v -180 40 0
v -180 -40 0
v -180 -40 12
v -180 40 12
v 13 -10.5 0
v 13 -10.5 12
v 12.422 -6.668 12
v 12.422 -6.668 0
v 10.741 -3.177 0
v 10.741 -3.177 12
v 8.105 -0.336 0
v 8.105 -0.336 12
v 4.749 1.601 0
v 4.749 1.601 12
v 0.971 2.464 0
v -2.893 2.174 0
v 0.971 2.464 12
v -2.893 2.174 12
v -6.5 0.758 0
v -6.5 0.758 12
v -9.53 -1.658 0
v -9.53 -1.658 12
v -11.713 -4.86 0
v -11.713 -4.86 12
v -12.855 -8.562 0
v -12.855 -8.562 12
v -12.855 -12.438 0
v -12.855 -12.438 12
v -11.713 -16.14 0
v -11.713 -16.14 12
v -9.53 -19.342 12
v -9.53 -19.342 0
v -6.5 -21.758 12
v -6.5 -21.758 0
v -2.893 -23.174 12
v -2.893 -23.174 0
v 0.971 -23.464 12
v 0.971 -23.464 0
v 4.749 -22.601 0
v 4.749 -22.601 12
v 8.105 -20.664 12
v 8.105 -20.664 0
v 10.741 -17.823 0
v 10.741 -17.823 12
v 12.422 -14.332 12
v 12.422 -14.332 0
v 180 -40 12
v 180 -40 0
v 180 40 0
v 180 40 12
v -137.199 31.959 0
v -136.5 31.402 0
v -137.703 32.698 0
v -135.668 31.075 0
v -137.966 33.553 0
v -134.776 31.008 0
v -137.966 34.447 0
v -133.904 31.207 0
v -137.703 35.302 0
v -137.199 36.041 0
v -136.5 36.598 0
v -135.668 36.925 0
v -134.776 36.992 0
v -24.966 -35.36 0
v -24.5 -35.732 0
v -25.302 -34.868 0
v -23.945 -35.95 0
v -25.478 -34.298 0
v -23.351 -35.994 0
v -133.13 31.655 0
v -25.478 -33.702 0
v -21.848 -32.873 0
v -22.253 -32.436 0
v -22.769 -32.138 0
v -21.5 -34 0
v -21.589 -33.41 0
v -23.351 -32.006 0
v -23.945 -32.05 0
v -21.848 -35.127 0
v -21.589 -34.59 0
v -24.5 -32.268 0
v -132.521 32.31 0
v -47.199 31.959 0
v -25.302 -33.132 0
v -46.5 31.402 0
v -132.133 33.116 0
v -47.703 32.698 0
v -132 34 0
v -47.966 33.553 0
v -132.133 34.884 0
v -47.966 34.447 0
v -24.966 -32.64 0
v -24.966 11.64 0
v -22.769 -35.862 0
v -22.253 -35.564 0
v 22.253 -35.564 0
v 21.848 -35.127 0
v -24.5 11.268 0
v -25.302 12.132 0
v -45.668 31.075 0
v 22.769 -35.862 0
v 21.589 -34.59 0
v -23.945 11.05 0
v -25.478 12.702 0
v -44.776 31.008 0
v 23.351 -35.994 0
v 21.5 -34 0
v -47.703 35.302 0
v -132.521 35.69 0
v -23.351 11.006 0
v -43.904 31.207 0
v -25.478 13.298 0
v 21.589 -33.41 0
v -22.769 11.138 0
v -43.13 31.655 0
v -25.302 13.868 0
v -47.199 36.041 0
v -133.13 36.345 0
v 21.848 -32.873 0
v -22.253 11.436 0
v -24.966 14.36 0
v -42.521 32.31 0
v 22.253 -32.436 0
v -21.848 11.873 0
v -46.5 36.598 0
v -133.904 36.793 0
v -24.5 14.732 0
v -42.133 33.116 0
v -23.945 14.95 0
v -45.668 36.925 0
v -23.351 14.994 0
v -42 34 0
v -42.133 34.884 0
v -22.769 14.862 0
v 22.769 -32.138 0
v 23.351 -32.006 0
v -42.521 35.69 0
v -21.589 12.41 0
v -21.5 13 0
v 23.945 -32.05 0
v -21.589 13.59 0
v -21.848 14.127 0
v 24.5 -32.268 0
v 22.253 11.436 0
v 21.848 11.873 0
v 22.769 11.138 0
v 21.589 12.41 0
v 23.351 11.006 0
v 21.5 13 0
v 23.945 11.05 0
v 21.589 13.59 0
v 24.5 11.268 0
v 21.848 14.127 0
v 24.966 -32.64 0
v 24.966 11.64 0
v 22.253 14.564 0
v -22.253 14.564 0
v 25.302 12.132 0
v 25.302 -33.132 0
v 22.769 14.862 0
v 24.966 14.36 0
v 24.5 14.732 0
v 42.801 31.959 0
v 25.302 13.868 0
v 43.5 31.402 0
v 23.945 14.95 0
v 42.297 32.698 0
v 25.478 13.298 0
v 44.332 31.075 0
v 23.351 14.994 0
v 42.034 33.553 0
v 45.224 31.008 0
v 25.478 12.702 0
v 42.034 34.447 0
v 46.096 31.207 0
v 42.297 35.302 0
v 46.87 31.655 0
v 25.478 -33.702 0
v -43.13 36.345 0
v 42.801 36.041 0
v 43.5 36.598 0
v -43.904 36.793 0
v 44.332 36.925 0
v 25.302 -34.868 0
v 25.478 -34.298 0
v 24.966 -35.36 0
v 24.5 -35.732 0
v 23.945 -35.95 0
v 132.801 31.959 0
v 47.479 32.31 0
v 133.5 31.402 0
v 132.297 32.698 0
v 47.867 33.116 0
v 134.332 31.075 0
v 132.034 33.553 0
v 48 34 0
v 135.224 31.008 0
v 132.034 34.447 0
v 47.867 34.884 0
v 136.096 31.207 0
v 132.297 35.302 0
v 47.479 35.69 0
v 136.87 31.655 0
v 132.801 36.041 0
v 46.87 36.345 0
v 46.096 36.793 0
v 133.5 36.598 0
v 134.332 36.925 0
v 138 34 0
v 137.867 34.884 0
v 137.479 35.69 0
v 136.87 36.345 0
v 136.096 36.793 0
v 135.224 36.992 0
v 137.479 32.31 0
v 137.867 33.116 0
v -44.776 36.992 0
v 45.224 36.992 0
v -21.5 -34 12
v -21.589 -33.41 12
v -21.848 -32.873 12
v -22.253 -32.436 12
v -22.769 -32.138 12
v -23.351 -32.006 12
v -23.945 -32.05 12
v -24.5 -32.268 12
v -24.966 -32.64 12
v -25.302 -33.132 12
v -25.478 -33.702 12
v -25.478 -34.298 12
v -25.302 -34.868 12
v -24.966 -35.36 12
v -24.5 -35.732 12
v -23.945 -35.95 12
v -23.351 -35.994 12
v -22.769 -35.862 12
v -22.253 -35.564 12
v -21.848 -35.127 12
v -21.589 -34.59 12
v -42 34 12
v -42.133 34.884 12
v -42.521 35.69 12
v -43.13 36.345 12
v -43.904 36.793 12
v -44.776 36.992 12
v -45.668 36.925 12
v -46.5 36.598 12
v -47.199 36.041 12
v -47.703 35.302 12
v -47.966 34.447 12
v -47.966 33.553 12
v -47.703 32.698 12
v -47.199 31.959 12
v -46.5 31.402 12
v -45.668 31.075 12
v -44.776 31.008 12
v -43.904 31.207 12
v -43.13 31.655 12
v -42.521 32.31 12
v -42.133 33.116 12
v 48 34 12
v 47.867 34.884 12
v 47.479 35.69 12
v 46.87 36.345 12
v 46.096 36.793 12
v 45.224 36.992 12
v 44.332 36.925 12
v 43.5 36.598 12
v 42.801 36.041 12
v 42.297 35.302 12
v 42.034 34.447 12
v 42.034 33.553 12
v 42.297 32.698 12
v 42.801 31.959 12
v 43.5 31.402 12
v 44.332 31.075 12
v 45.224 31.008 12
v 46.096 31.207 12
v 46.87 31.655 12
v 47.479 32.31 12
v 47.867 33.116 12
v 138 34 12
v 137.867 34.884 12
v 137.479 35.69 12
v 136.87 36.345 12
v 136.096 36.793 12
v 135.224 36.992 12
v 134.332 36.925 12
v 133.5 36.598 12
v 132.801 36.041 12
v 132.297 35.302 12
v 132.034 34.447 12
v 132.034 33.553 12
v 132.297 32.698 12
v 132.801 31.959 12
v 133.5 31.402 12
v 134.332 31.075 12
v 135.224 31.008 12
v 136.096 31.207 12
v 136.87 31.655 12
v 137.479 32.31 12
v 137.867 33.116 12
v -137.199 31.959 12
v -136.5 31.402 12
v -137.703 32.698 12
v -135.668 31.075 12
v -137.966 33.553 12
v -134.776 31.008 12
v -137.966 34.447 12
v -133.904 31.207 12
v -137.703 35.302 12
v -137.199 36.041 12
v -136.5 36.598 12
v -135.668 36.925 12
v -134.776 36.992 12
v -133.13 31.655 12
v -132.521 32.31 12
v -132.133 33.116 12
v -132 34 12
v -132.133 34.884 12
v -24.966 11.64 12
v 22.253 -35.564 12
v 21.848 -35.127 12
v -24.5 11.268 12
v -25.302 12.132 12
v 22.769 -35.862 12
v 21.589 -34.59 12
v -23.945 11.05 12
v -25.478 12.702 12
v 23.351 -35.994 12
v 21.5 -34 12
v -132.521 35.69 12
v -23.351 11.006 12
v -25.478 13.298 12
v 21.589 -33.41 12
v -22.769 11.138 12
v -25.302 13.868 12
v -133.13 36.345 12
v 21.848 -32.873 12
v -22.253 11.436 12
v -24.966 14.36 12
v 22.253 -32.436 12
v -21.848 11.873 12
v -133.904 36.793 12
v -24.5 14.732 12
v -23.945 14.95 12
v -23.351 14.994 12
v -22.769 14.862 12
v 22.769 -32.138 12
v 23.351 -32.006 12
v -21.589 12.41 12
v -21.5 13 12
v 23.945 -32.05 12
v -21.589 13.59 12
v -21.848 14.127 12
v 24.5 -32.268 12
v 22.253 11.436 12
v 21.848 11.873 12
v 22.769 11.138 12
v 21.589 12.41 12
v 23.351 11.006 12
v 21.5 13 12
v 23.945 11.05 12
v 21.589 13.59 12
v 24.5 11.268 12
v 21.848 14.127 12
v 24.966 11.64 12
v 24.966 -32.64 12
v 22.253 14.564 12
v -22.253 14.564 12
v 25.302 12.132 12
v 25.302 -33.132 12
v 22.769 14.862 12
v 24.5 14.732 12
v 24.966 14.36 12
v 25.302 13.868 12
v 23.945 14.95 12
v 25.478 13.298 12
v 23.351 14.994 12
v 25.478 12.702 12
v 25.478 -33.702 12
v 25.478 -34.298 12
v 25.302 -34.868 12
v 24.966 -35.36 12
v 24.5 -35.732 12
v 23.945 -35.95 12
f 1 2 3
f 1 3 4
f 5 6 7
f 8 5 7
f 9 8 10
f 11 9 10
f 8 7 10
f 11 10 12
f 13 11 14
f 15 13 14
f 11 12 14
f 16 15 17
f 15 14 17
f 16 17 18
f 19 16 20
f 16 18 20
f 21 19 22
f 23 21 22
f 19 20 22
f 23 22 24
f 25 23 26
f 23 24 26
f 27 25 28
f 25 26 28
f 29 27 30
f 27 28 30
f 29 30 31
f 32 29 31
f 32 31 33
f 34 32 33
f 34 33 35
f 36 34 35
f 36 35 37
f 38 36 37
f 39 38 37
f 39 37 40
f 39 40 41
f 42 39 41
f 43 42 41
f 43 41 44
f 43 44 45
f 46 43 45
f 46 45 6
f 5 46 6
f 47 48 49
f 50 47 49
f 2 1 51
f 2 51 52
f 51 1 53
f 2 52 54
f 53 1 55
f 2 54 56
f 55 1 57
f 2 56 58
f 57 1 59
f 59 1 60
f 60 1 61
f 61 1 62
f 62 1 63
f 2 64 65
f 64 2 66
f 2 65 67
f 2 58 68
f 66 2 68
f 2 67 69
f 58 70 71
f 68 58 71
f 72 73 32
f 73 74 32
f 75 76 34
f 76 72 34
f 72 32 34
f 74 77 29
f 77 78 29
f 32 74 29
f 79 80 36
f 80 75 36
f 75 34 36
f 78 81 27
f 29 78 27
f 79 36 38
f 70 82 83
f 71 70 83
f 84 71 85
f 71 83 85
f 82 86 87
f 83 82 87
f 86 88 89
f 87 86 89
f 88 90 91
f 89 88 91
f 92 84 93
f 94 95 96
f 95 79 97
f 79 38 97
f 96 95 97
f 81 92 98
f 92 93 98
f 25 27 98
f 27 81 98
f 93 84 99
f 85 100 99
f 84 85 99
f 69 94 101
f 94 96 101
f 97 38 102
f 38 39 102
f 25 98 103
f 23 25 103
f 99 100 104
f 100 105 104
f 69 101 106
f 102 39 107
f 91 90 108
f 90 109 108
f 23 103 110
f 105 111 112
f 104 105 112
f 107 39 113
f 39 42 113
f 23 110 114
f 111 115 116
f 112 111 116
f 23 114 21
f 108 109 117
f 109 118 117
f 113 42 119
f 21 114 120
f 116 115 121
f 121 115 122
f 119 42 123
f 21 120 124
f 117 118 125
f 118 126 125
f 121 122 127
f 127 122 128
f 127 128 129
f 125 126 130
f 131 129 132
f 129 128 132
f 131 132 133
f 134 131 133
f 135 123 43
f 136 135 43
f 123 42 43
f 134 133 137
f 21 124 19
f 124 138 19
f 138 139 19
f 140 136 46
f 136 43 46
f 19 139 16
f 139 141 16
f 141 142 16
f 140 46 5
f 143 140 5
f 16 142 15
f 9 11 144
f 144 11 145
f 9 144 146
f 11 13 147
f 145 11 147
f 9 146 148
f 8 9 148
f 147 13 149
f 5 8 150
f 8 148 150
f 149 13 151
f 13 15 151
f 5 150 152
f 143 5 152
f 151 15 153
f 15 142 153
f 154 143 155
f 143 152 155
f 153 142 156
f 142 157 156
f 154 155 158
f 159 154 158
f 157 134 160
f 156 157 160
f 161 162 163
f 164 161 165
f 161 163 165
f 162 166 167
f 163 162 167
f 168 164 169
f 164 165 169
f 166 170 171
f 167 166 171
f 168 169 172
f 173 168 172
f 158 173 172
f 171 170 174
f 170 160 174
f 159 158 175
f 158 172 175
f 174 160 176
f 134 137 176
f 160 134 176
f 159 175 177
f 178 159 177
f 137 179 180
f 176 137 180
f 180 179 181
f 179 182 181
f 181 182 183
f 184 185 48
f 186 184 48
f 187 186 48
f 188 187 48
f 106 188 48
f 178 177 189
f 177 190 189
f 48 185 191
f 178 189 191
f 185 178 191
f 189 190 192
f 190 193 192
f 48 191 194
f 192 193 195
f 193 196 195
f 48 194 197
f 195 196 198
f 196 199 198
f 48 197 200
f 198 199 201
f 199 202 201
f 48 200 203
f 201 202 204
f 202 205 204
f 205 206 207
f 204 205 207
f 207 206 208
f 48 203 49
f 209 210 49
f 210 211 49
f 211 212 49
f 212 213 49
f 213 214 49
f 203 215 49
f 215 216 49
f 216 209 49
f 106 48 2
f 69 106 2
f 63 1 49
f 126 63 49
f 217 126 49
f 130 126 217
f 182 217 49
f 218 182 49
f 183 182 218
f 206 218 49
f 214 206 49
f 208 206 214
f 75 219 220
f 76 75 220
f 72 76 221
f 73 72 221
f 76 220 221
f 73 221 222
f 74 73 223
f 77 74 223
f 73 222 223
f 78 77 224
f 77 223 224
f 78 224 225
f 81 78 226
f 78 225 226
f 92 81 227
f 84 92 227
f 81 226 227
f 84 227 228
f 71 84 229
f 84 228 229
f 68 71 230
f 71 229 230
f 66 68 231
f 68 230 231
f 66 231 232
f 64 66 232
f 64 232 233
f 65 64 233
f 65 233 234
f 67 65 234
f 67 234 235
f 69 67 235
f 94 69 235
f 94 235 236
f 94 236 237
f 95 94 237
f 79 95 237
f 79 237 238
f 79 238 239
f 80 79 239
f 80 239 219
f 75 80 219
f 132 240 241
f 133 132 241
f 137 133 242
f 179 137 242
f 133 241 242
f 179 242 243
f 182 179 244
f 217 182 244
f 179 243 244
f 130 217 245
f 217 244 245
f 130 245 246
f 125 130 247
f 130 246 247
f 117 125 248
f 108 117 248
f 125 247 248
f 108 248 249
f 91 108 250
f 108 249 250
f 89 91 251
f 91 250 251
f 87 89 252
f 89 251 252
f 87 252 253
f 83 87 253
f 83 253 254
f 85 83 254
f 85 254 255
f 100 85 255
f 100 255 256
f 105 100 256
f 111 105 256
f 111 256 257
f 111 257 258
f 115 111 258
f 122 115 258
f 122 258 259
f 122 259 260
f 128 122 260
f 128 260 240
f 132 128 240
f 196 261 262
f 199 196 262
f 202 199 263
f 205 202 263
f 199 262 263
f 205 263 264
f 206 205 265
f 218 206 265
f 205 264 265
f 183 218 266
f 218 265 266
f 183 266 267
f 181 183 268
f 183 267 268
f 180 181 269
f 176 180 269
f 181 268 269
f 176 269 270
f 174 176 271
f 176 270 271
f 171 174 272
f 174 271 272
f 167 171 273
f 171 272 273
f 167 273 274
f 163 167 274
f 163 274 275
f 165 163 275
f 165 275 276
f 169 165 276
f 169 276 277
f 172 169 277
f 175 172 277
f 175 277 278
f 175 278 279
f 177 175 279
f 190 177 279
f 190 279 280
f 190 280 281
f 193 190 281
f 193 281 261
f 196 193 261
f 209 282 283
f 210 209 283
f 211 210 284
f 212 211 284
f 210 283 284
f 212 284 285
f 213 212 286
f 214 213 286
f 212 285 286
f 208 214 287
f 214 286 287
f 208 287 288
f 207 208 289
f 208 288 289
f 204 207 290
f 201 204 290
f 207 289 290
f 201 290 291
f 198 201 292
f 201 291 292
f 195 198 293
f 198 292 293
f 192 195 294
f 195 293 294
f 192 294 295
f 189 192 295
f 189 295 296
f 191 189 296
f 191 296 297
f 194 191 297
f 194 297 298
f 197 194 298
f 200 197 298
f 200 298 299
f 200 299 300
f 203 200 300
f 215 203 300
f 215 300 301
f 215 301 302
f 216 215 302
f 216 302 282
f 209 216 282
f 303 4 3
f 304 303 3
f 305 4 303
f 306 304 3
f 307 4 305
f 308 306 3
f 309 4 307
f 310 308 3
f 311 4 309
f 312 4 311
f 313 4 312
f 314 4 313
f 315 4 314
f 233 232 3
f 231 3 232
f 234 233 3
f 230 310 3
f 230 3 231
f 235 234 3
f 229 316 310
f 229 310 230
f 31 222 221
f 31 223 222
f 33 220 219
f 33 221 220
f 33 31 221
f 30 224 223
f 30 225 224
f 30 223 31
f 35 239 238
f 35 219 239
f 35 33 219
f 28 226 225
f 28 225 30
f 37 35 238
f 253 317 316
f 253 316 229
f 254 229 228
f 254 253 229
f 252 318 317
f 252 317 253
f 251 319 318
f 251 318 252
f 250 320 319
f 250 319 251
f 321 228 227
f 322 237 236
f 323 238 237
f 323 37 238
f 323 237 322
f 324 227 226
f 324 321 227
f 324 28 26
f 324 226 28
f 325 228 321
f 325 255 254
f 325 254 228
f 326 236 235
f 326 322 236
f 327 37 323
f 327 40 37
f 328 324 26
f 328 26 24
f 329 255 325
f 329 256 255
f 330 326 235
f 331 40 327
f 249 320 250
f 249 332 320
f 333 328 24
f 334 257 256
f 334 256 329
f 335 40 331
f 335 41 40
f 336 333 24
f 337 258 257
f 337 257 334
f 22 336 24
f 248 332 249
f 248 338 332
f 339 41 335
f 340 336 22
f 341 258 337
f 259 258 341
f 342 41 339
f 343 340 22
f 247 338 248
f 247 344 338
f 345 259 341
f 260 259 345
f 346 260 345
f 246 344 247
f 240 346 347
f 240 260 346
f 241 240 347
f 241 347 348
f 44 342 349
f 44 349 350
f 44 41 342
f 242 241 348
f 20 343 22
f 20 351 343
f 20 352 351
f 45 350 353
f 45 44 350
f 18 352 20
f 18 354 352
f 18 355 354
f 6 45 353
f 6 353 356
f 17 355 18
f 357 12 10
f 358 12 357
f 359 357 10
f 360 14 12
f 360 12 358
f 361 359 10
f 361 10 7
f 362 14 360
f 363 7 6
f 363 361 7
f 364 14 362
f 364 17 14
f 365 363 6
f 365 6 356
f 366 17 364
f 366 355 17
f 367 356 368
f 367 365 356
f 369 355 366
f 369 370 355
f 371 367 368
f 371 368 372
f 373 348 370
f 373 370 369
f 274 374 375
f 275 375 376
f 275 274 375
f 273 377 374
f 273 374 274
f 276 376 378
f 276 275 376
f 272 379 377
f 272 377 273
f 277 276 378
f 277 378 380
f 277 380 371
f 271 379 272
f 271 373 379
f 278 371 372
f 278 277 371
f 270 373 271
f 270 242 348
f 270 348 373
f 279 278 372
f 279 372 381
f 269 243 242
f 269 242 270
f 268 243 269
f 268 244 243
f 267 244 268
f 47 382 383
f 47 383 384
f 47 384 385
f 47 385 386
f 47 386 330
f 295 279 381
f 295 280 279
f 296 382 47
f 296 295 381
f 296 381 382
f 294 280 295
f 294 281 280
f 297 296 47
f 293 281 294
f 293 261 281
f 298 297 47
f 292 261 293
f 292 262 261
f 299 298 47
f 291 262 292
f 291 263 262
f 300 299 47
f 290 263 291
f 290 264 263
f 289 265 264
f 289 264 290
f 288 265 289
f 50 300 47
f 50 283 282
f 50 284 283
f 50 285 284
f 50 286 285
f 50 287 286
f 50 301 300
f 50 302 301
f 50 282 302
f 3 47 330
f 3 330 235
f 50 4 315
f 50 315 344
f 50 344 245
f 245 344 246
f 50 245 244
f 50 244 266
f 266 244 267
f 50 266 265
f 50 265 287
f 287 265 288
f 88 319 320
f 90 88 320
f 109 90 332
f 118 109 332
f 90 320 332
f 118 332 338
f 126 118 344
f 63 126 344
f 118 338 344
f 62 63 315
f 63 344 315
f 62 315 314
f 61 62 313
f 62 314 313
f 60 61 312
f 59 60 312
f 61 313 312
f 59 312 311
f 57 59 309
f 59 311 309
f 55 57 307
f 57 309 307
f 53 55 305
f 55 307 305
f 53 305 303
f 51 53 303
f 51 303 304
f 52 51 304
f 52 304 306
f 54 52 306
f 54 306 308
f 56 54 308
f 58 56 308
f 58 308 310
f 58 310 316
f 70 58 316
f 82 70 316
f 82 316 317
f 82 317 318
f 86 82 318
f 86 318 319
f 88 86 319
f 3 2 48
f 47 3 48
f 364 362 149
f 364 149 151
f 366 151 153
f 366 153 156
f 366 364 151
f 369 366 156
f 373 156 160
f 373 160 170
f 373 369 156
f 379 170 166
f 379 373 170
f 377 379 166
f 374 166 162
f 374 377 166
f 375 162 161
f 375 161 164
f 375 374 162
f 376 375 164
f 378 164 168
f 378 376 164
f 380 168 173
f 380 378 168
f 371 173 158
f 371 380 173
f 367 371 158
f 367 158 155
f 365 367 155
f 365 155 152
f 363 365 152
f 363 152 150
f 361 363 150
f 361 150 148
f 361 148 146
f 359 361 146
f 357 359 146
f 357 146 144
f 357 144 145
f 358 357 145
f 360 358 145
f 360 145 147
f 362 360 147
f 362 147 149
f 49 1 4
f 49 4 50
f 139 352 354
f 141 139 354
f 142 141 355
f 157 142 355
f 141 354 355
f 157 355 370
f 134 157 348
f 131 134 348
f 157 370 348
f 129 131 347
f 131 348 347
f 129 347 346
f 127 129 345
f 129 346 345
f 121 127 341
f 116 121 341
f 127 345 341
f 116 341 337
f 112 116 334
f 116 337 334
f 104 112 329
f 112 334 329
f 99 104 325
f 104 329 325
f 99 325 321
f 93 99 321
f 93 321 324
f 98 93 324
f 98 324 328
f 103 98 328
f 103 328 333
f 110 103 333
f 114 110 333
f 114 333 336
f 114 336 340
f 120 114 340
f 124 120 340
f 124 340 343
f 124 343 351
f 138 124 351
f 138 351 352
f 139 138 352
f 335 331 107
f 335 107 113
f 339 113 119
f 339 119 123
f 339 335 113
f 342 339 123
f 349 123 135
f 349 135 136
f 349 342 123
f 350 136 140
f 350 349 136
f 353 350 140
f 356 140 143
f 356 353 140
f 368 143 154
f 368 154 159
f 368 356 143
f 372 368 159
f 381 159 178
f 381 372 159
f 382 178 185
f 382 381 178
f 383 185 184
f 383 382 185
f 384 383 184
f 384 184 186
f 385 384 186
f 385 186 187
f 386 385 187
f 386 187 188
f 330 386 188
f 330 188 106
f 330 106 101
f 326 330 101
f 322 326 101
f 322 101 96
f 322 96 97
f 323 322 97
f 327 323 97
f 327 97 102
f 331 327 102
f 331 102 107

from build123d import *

# Parameters (mm, degrees)
SKETCH1_W           = 360
SKETCH1_H           = 80
BOSS_EXTRUDE1_DEPTH = 12
CUT_EXTRUDE1_REACH  = 186.781
SKETCH2_R           = 3
LPATTERN1_COUNT     = 4
LPATTERN1_PITCH     = 90
CUT_EXTRUDE2_REACH  = 186.781
SKETCH3_R           = 13
CUT_EXTRUDE3_REACH  = 186.781
SKETCH4_R           = 2


with BuildPart() as part:
    # Sketch1 → Boss-Extrude1 (new body)
    with BuildSketch(Plane.XY):
        Rectangle(SKETCH1_W, SKETCH1_H)
    extrude(amount=BOSS_EXTRUDE1_DEPTH)

    # Sketch2 → Cut-Extrude1 (cut, up to next)
    with BuildSketch(Plane.XY.offset(12), mode=Mode.PRIVATE) as cut_extrude1_sk1:
        with Locations((135, 34)):
            Circle(SKETCH2_R)
    cut_extrude1_tool1 = extrude(cut_extrude1_sk1.sketch, amount=-CUT_EXTRUDE1_REACH, mode=Mode.PRIVATE) & part.part
    cut_extrude1 = cut_extrude1_tool1.solids().sort_by_distance((135, 34, 12))[0]
    add(cut_extrude1, mode=Mode.SUBTRACT)

    # LPattern1: Cut-Extrude1 ×4
    with Locations(*[(-i * LPATTERN1_PITCH, 0, 0) for i in range(1, LPATTERN1_COUNT)]):
        add(cut_extrude1, mode=Mode.SUBTRACT)

    # Sketch3 → Cut-Extrude2 (cut, up to next)
    with BuildSketch(Plane.XY.offset(12), mode=Mode.PRIVATE) as cut_extrude2_sk1:
        with Locations((0, -10.5)):
            Circle(SKETCH3_R)
    cut_extrude2_tool1 = extrude(cut_extrude2_sk1.sketch, amount=-CUT_EXTRUDE2_REACH, mode=Mode.PRIVATE) & part.part
    add(cut_extrude2_tool1.solids().sort_by_distance((0, -10.5, 12))[0], mode=Mode.SUBTRACT)

    # Sketch4 → Cut-Extrude3 (cut, up to next)
    with BuildSketch(Plane.XY.offset(12), mode=Mode.PRIVATE) as cut_extrude3_sk1:
        with Locations((-23.5, 13)):
            Circle(SKETCH4_R)
    cut_extrude3_tool1 = extrude(cut_extrude3_sk1.sketch, amount=-CUT_EXTRUDE3_REACH, mode=Mode.PRIVATE) & part.part
    # Sketch4 → Cut-Extrude3 (cut, up to next)
    with BuildSketch(Plane.XY.offset(12), mode=Mode.PRIVATE) as cut_extrude3_sk2:
        with Locations((-23.5, -34)):
            Circle(SKETCH4_R)
    cut_extrude3_tool2 = extrude(cut_extrude3_sk2.sketch, amount=-CUT_EXTRUDE3_REACH, mode=Mode.PRIVATE) & part.part
    cut_extrude3_1 = cut_extrude3_tool1.solids().sort_by_distance((-23.5, 13, 12))[0]
    add(cut_extrude3_1, mode=Mode.SUBTRACT)
    cut_extrude3_2 = cut_extrude3_tool2.solids().sort_by_distance((-23.5, -34, 12))[0]
    add(cut_extrude3_2, mode=Mode.SUBTRACT)
    cut_extrude3 = cut_extrude3_1 + cut_extrude3_2  # Cut-Extrude3 as one shape, for the pattern or mirror that repeats it

    # Mirror2: Cut-Extrude3 across plane
    add(cut_extrude3.mirror(Plane(origin=(0, 0, 0), x_dir=(0, 0, 1), z_dir=(1, 0, 0))), mode=Mode.SUBTRACT)


solid = part.part
